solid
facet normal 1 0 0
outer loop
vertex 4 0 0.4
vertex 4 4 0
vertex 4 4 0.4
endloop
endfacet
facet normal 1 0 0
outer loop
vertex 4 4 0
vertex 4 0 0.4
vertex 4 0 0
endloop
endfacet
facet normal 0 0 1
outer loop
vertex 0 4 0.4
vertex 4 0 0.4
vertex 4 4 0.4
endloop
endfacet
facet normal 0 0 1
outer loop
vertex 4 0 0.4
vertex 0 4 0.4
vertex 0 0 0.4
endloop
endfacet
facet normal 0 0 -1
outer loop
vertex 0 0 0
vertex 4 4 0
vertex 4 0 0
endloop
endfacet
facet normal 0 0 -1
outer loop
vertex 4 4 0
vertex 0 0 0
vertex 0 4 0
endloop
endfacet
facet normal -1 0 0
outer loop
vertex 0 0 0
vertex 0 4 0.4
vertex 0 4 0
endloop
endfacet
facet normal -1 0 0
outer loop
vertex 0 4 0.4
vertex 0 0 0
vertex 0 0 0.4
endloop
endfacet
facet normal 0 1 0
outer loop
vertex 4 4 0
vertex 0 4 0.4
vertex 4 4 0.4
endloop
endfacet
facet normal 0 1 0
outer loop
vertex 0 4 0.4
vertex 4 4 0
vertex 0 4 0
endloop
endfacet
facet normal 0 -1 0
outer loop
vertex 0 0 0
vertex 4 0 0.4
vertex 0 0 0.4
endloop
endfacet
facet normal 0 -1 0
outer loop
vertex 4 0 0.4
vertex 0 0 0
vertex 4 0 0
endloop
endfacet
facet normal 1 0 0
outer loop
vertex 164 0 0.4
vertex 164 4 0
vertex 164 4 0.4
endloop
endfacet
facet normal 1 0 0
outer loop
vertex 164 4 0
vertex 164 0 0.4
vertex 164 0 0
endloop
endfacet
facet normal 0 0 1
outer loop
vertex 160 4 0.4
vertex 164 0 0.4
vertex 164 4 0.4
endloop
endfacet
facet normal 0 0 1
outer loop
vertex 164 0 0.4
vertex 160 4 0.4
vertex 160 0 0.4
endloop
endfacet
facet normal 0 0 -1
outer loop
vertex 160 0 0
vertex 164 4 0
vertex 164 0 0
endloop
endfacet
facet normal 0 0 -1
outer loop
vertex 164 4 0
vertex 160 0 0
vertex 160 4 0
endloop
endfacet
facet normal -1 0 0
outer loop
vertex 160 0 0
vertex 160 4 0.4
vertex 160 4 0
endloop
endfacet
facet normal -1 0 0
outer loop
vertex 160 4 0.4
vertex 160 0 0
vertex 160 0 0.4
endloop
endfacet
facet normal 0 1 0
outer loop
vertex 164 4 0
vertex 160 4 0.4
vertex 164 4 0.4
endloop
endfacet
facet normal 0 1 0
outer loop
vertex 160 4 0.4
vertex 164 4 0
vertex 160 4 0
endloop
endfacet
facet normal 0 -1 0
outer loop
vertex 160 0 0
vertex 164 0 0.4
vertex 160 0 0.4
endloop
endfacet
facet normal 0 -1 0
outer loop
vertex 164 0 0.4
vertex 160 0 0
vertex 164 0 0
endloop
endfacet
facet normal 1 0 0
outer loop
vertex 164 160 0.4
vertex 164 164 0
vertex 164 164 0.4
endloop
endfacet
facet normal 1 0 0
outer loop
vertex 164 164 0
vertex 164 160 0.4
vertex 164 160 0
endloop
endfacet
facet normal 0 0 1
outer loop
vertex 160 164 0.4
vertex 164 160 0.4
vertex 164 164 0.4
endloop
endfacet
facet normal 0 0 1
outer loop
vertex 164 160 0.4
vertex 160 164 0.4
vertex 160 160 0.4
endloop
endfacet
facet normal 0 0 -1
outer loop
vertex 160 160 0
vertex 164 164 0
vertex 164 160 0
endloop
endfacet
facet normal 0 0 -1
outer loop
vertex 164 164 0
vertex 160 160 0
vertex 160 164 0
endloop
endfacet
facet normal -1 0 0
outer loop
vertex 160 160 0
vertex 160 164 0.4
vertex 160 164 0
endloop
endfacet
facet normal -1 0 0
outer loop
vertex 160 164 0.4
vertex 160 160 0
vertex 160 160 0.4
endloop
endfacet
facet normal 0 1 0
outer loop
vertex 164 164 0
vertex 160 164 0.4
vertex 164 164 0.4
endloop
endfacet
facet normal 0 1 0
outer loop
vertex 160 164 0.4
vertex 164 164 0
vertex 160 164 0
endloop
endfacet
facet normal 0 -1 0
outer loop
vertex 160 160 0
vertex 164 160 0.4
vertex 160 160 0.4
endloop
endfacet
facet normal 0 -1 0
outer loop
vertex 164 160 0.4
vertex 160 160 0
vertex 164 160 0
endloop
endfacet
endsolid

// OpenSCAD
translate([0,0,0])
	scale([1,1,0.1])
		cube(4);


translate([160,0,0])
	scale([1,1,0.1])
		cube(4);

translate([160,160,0])
	scale([1,1,0.1])
		cube(4);
